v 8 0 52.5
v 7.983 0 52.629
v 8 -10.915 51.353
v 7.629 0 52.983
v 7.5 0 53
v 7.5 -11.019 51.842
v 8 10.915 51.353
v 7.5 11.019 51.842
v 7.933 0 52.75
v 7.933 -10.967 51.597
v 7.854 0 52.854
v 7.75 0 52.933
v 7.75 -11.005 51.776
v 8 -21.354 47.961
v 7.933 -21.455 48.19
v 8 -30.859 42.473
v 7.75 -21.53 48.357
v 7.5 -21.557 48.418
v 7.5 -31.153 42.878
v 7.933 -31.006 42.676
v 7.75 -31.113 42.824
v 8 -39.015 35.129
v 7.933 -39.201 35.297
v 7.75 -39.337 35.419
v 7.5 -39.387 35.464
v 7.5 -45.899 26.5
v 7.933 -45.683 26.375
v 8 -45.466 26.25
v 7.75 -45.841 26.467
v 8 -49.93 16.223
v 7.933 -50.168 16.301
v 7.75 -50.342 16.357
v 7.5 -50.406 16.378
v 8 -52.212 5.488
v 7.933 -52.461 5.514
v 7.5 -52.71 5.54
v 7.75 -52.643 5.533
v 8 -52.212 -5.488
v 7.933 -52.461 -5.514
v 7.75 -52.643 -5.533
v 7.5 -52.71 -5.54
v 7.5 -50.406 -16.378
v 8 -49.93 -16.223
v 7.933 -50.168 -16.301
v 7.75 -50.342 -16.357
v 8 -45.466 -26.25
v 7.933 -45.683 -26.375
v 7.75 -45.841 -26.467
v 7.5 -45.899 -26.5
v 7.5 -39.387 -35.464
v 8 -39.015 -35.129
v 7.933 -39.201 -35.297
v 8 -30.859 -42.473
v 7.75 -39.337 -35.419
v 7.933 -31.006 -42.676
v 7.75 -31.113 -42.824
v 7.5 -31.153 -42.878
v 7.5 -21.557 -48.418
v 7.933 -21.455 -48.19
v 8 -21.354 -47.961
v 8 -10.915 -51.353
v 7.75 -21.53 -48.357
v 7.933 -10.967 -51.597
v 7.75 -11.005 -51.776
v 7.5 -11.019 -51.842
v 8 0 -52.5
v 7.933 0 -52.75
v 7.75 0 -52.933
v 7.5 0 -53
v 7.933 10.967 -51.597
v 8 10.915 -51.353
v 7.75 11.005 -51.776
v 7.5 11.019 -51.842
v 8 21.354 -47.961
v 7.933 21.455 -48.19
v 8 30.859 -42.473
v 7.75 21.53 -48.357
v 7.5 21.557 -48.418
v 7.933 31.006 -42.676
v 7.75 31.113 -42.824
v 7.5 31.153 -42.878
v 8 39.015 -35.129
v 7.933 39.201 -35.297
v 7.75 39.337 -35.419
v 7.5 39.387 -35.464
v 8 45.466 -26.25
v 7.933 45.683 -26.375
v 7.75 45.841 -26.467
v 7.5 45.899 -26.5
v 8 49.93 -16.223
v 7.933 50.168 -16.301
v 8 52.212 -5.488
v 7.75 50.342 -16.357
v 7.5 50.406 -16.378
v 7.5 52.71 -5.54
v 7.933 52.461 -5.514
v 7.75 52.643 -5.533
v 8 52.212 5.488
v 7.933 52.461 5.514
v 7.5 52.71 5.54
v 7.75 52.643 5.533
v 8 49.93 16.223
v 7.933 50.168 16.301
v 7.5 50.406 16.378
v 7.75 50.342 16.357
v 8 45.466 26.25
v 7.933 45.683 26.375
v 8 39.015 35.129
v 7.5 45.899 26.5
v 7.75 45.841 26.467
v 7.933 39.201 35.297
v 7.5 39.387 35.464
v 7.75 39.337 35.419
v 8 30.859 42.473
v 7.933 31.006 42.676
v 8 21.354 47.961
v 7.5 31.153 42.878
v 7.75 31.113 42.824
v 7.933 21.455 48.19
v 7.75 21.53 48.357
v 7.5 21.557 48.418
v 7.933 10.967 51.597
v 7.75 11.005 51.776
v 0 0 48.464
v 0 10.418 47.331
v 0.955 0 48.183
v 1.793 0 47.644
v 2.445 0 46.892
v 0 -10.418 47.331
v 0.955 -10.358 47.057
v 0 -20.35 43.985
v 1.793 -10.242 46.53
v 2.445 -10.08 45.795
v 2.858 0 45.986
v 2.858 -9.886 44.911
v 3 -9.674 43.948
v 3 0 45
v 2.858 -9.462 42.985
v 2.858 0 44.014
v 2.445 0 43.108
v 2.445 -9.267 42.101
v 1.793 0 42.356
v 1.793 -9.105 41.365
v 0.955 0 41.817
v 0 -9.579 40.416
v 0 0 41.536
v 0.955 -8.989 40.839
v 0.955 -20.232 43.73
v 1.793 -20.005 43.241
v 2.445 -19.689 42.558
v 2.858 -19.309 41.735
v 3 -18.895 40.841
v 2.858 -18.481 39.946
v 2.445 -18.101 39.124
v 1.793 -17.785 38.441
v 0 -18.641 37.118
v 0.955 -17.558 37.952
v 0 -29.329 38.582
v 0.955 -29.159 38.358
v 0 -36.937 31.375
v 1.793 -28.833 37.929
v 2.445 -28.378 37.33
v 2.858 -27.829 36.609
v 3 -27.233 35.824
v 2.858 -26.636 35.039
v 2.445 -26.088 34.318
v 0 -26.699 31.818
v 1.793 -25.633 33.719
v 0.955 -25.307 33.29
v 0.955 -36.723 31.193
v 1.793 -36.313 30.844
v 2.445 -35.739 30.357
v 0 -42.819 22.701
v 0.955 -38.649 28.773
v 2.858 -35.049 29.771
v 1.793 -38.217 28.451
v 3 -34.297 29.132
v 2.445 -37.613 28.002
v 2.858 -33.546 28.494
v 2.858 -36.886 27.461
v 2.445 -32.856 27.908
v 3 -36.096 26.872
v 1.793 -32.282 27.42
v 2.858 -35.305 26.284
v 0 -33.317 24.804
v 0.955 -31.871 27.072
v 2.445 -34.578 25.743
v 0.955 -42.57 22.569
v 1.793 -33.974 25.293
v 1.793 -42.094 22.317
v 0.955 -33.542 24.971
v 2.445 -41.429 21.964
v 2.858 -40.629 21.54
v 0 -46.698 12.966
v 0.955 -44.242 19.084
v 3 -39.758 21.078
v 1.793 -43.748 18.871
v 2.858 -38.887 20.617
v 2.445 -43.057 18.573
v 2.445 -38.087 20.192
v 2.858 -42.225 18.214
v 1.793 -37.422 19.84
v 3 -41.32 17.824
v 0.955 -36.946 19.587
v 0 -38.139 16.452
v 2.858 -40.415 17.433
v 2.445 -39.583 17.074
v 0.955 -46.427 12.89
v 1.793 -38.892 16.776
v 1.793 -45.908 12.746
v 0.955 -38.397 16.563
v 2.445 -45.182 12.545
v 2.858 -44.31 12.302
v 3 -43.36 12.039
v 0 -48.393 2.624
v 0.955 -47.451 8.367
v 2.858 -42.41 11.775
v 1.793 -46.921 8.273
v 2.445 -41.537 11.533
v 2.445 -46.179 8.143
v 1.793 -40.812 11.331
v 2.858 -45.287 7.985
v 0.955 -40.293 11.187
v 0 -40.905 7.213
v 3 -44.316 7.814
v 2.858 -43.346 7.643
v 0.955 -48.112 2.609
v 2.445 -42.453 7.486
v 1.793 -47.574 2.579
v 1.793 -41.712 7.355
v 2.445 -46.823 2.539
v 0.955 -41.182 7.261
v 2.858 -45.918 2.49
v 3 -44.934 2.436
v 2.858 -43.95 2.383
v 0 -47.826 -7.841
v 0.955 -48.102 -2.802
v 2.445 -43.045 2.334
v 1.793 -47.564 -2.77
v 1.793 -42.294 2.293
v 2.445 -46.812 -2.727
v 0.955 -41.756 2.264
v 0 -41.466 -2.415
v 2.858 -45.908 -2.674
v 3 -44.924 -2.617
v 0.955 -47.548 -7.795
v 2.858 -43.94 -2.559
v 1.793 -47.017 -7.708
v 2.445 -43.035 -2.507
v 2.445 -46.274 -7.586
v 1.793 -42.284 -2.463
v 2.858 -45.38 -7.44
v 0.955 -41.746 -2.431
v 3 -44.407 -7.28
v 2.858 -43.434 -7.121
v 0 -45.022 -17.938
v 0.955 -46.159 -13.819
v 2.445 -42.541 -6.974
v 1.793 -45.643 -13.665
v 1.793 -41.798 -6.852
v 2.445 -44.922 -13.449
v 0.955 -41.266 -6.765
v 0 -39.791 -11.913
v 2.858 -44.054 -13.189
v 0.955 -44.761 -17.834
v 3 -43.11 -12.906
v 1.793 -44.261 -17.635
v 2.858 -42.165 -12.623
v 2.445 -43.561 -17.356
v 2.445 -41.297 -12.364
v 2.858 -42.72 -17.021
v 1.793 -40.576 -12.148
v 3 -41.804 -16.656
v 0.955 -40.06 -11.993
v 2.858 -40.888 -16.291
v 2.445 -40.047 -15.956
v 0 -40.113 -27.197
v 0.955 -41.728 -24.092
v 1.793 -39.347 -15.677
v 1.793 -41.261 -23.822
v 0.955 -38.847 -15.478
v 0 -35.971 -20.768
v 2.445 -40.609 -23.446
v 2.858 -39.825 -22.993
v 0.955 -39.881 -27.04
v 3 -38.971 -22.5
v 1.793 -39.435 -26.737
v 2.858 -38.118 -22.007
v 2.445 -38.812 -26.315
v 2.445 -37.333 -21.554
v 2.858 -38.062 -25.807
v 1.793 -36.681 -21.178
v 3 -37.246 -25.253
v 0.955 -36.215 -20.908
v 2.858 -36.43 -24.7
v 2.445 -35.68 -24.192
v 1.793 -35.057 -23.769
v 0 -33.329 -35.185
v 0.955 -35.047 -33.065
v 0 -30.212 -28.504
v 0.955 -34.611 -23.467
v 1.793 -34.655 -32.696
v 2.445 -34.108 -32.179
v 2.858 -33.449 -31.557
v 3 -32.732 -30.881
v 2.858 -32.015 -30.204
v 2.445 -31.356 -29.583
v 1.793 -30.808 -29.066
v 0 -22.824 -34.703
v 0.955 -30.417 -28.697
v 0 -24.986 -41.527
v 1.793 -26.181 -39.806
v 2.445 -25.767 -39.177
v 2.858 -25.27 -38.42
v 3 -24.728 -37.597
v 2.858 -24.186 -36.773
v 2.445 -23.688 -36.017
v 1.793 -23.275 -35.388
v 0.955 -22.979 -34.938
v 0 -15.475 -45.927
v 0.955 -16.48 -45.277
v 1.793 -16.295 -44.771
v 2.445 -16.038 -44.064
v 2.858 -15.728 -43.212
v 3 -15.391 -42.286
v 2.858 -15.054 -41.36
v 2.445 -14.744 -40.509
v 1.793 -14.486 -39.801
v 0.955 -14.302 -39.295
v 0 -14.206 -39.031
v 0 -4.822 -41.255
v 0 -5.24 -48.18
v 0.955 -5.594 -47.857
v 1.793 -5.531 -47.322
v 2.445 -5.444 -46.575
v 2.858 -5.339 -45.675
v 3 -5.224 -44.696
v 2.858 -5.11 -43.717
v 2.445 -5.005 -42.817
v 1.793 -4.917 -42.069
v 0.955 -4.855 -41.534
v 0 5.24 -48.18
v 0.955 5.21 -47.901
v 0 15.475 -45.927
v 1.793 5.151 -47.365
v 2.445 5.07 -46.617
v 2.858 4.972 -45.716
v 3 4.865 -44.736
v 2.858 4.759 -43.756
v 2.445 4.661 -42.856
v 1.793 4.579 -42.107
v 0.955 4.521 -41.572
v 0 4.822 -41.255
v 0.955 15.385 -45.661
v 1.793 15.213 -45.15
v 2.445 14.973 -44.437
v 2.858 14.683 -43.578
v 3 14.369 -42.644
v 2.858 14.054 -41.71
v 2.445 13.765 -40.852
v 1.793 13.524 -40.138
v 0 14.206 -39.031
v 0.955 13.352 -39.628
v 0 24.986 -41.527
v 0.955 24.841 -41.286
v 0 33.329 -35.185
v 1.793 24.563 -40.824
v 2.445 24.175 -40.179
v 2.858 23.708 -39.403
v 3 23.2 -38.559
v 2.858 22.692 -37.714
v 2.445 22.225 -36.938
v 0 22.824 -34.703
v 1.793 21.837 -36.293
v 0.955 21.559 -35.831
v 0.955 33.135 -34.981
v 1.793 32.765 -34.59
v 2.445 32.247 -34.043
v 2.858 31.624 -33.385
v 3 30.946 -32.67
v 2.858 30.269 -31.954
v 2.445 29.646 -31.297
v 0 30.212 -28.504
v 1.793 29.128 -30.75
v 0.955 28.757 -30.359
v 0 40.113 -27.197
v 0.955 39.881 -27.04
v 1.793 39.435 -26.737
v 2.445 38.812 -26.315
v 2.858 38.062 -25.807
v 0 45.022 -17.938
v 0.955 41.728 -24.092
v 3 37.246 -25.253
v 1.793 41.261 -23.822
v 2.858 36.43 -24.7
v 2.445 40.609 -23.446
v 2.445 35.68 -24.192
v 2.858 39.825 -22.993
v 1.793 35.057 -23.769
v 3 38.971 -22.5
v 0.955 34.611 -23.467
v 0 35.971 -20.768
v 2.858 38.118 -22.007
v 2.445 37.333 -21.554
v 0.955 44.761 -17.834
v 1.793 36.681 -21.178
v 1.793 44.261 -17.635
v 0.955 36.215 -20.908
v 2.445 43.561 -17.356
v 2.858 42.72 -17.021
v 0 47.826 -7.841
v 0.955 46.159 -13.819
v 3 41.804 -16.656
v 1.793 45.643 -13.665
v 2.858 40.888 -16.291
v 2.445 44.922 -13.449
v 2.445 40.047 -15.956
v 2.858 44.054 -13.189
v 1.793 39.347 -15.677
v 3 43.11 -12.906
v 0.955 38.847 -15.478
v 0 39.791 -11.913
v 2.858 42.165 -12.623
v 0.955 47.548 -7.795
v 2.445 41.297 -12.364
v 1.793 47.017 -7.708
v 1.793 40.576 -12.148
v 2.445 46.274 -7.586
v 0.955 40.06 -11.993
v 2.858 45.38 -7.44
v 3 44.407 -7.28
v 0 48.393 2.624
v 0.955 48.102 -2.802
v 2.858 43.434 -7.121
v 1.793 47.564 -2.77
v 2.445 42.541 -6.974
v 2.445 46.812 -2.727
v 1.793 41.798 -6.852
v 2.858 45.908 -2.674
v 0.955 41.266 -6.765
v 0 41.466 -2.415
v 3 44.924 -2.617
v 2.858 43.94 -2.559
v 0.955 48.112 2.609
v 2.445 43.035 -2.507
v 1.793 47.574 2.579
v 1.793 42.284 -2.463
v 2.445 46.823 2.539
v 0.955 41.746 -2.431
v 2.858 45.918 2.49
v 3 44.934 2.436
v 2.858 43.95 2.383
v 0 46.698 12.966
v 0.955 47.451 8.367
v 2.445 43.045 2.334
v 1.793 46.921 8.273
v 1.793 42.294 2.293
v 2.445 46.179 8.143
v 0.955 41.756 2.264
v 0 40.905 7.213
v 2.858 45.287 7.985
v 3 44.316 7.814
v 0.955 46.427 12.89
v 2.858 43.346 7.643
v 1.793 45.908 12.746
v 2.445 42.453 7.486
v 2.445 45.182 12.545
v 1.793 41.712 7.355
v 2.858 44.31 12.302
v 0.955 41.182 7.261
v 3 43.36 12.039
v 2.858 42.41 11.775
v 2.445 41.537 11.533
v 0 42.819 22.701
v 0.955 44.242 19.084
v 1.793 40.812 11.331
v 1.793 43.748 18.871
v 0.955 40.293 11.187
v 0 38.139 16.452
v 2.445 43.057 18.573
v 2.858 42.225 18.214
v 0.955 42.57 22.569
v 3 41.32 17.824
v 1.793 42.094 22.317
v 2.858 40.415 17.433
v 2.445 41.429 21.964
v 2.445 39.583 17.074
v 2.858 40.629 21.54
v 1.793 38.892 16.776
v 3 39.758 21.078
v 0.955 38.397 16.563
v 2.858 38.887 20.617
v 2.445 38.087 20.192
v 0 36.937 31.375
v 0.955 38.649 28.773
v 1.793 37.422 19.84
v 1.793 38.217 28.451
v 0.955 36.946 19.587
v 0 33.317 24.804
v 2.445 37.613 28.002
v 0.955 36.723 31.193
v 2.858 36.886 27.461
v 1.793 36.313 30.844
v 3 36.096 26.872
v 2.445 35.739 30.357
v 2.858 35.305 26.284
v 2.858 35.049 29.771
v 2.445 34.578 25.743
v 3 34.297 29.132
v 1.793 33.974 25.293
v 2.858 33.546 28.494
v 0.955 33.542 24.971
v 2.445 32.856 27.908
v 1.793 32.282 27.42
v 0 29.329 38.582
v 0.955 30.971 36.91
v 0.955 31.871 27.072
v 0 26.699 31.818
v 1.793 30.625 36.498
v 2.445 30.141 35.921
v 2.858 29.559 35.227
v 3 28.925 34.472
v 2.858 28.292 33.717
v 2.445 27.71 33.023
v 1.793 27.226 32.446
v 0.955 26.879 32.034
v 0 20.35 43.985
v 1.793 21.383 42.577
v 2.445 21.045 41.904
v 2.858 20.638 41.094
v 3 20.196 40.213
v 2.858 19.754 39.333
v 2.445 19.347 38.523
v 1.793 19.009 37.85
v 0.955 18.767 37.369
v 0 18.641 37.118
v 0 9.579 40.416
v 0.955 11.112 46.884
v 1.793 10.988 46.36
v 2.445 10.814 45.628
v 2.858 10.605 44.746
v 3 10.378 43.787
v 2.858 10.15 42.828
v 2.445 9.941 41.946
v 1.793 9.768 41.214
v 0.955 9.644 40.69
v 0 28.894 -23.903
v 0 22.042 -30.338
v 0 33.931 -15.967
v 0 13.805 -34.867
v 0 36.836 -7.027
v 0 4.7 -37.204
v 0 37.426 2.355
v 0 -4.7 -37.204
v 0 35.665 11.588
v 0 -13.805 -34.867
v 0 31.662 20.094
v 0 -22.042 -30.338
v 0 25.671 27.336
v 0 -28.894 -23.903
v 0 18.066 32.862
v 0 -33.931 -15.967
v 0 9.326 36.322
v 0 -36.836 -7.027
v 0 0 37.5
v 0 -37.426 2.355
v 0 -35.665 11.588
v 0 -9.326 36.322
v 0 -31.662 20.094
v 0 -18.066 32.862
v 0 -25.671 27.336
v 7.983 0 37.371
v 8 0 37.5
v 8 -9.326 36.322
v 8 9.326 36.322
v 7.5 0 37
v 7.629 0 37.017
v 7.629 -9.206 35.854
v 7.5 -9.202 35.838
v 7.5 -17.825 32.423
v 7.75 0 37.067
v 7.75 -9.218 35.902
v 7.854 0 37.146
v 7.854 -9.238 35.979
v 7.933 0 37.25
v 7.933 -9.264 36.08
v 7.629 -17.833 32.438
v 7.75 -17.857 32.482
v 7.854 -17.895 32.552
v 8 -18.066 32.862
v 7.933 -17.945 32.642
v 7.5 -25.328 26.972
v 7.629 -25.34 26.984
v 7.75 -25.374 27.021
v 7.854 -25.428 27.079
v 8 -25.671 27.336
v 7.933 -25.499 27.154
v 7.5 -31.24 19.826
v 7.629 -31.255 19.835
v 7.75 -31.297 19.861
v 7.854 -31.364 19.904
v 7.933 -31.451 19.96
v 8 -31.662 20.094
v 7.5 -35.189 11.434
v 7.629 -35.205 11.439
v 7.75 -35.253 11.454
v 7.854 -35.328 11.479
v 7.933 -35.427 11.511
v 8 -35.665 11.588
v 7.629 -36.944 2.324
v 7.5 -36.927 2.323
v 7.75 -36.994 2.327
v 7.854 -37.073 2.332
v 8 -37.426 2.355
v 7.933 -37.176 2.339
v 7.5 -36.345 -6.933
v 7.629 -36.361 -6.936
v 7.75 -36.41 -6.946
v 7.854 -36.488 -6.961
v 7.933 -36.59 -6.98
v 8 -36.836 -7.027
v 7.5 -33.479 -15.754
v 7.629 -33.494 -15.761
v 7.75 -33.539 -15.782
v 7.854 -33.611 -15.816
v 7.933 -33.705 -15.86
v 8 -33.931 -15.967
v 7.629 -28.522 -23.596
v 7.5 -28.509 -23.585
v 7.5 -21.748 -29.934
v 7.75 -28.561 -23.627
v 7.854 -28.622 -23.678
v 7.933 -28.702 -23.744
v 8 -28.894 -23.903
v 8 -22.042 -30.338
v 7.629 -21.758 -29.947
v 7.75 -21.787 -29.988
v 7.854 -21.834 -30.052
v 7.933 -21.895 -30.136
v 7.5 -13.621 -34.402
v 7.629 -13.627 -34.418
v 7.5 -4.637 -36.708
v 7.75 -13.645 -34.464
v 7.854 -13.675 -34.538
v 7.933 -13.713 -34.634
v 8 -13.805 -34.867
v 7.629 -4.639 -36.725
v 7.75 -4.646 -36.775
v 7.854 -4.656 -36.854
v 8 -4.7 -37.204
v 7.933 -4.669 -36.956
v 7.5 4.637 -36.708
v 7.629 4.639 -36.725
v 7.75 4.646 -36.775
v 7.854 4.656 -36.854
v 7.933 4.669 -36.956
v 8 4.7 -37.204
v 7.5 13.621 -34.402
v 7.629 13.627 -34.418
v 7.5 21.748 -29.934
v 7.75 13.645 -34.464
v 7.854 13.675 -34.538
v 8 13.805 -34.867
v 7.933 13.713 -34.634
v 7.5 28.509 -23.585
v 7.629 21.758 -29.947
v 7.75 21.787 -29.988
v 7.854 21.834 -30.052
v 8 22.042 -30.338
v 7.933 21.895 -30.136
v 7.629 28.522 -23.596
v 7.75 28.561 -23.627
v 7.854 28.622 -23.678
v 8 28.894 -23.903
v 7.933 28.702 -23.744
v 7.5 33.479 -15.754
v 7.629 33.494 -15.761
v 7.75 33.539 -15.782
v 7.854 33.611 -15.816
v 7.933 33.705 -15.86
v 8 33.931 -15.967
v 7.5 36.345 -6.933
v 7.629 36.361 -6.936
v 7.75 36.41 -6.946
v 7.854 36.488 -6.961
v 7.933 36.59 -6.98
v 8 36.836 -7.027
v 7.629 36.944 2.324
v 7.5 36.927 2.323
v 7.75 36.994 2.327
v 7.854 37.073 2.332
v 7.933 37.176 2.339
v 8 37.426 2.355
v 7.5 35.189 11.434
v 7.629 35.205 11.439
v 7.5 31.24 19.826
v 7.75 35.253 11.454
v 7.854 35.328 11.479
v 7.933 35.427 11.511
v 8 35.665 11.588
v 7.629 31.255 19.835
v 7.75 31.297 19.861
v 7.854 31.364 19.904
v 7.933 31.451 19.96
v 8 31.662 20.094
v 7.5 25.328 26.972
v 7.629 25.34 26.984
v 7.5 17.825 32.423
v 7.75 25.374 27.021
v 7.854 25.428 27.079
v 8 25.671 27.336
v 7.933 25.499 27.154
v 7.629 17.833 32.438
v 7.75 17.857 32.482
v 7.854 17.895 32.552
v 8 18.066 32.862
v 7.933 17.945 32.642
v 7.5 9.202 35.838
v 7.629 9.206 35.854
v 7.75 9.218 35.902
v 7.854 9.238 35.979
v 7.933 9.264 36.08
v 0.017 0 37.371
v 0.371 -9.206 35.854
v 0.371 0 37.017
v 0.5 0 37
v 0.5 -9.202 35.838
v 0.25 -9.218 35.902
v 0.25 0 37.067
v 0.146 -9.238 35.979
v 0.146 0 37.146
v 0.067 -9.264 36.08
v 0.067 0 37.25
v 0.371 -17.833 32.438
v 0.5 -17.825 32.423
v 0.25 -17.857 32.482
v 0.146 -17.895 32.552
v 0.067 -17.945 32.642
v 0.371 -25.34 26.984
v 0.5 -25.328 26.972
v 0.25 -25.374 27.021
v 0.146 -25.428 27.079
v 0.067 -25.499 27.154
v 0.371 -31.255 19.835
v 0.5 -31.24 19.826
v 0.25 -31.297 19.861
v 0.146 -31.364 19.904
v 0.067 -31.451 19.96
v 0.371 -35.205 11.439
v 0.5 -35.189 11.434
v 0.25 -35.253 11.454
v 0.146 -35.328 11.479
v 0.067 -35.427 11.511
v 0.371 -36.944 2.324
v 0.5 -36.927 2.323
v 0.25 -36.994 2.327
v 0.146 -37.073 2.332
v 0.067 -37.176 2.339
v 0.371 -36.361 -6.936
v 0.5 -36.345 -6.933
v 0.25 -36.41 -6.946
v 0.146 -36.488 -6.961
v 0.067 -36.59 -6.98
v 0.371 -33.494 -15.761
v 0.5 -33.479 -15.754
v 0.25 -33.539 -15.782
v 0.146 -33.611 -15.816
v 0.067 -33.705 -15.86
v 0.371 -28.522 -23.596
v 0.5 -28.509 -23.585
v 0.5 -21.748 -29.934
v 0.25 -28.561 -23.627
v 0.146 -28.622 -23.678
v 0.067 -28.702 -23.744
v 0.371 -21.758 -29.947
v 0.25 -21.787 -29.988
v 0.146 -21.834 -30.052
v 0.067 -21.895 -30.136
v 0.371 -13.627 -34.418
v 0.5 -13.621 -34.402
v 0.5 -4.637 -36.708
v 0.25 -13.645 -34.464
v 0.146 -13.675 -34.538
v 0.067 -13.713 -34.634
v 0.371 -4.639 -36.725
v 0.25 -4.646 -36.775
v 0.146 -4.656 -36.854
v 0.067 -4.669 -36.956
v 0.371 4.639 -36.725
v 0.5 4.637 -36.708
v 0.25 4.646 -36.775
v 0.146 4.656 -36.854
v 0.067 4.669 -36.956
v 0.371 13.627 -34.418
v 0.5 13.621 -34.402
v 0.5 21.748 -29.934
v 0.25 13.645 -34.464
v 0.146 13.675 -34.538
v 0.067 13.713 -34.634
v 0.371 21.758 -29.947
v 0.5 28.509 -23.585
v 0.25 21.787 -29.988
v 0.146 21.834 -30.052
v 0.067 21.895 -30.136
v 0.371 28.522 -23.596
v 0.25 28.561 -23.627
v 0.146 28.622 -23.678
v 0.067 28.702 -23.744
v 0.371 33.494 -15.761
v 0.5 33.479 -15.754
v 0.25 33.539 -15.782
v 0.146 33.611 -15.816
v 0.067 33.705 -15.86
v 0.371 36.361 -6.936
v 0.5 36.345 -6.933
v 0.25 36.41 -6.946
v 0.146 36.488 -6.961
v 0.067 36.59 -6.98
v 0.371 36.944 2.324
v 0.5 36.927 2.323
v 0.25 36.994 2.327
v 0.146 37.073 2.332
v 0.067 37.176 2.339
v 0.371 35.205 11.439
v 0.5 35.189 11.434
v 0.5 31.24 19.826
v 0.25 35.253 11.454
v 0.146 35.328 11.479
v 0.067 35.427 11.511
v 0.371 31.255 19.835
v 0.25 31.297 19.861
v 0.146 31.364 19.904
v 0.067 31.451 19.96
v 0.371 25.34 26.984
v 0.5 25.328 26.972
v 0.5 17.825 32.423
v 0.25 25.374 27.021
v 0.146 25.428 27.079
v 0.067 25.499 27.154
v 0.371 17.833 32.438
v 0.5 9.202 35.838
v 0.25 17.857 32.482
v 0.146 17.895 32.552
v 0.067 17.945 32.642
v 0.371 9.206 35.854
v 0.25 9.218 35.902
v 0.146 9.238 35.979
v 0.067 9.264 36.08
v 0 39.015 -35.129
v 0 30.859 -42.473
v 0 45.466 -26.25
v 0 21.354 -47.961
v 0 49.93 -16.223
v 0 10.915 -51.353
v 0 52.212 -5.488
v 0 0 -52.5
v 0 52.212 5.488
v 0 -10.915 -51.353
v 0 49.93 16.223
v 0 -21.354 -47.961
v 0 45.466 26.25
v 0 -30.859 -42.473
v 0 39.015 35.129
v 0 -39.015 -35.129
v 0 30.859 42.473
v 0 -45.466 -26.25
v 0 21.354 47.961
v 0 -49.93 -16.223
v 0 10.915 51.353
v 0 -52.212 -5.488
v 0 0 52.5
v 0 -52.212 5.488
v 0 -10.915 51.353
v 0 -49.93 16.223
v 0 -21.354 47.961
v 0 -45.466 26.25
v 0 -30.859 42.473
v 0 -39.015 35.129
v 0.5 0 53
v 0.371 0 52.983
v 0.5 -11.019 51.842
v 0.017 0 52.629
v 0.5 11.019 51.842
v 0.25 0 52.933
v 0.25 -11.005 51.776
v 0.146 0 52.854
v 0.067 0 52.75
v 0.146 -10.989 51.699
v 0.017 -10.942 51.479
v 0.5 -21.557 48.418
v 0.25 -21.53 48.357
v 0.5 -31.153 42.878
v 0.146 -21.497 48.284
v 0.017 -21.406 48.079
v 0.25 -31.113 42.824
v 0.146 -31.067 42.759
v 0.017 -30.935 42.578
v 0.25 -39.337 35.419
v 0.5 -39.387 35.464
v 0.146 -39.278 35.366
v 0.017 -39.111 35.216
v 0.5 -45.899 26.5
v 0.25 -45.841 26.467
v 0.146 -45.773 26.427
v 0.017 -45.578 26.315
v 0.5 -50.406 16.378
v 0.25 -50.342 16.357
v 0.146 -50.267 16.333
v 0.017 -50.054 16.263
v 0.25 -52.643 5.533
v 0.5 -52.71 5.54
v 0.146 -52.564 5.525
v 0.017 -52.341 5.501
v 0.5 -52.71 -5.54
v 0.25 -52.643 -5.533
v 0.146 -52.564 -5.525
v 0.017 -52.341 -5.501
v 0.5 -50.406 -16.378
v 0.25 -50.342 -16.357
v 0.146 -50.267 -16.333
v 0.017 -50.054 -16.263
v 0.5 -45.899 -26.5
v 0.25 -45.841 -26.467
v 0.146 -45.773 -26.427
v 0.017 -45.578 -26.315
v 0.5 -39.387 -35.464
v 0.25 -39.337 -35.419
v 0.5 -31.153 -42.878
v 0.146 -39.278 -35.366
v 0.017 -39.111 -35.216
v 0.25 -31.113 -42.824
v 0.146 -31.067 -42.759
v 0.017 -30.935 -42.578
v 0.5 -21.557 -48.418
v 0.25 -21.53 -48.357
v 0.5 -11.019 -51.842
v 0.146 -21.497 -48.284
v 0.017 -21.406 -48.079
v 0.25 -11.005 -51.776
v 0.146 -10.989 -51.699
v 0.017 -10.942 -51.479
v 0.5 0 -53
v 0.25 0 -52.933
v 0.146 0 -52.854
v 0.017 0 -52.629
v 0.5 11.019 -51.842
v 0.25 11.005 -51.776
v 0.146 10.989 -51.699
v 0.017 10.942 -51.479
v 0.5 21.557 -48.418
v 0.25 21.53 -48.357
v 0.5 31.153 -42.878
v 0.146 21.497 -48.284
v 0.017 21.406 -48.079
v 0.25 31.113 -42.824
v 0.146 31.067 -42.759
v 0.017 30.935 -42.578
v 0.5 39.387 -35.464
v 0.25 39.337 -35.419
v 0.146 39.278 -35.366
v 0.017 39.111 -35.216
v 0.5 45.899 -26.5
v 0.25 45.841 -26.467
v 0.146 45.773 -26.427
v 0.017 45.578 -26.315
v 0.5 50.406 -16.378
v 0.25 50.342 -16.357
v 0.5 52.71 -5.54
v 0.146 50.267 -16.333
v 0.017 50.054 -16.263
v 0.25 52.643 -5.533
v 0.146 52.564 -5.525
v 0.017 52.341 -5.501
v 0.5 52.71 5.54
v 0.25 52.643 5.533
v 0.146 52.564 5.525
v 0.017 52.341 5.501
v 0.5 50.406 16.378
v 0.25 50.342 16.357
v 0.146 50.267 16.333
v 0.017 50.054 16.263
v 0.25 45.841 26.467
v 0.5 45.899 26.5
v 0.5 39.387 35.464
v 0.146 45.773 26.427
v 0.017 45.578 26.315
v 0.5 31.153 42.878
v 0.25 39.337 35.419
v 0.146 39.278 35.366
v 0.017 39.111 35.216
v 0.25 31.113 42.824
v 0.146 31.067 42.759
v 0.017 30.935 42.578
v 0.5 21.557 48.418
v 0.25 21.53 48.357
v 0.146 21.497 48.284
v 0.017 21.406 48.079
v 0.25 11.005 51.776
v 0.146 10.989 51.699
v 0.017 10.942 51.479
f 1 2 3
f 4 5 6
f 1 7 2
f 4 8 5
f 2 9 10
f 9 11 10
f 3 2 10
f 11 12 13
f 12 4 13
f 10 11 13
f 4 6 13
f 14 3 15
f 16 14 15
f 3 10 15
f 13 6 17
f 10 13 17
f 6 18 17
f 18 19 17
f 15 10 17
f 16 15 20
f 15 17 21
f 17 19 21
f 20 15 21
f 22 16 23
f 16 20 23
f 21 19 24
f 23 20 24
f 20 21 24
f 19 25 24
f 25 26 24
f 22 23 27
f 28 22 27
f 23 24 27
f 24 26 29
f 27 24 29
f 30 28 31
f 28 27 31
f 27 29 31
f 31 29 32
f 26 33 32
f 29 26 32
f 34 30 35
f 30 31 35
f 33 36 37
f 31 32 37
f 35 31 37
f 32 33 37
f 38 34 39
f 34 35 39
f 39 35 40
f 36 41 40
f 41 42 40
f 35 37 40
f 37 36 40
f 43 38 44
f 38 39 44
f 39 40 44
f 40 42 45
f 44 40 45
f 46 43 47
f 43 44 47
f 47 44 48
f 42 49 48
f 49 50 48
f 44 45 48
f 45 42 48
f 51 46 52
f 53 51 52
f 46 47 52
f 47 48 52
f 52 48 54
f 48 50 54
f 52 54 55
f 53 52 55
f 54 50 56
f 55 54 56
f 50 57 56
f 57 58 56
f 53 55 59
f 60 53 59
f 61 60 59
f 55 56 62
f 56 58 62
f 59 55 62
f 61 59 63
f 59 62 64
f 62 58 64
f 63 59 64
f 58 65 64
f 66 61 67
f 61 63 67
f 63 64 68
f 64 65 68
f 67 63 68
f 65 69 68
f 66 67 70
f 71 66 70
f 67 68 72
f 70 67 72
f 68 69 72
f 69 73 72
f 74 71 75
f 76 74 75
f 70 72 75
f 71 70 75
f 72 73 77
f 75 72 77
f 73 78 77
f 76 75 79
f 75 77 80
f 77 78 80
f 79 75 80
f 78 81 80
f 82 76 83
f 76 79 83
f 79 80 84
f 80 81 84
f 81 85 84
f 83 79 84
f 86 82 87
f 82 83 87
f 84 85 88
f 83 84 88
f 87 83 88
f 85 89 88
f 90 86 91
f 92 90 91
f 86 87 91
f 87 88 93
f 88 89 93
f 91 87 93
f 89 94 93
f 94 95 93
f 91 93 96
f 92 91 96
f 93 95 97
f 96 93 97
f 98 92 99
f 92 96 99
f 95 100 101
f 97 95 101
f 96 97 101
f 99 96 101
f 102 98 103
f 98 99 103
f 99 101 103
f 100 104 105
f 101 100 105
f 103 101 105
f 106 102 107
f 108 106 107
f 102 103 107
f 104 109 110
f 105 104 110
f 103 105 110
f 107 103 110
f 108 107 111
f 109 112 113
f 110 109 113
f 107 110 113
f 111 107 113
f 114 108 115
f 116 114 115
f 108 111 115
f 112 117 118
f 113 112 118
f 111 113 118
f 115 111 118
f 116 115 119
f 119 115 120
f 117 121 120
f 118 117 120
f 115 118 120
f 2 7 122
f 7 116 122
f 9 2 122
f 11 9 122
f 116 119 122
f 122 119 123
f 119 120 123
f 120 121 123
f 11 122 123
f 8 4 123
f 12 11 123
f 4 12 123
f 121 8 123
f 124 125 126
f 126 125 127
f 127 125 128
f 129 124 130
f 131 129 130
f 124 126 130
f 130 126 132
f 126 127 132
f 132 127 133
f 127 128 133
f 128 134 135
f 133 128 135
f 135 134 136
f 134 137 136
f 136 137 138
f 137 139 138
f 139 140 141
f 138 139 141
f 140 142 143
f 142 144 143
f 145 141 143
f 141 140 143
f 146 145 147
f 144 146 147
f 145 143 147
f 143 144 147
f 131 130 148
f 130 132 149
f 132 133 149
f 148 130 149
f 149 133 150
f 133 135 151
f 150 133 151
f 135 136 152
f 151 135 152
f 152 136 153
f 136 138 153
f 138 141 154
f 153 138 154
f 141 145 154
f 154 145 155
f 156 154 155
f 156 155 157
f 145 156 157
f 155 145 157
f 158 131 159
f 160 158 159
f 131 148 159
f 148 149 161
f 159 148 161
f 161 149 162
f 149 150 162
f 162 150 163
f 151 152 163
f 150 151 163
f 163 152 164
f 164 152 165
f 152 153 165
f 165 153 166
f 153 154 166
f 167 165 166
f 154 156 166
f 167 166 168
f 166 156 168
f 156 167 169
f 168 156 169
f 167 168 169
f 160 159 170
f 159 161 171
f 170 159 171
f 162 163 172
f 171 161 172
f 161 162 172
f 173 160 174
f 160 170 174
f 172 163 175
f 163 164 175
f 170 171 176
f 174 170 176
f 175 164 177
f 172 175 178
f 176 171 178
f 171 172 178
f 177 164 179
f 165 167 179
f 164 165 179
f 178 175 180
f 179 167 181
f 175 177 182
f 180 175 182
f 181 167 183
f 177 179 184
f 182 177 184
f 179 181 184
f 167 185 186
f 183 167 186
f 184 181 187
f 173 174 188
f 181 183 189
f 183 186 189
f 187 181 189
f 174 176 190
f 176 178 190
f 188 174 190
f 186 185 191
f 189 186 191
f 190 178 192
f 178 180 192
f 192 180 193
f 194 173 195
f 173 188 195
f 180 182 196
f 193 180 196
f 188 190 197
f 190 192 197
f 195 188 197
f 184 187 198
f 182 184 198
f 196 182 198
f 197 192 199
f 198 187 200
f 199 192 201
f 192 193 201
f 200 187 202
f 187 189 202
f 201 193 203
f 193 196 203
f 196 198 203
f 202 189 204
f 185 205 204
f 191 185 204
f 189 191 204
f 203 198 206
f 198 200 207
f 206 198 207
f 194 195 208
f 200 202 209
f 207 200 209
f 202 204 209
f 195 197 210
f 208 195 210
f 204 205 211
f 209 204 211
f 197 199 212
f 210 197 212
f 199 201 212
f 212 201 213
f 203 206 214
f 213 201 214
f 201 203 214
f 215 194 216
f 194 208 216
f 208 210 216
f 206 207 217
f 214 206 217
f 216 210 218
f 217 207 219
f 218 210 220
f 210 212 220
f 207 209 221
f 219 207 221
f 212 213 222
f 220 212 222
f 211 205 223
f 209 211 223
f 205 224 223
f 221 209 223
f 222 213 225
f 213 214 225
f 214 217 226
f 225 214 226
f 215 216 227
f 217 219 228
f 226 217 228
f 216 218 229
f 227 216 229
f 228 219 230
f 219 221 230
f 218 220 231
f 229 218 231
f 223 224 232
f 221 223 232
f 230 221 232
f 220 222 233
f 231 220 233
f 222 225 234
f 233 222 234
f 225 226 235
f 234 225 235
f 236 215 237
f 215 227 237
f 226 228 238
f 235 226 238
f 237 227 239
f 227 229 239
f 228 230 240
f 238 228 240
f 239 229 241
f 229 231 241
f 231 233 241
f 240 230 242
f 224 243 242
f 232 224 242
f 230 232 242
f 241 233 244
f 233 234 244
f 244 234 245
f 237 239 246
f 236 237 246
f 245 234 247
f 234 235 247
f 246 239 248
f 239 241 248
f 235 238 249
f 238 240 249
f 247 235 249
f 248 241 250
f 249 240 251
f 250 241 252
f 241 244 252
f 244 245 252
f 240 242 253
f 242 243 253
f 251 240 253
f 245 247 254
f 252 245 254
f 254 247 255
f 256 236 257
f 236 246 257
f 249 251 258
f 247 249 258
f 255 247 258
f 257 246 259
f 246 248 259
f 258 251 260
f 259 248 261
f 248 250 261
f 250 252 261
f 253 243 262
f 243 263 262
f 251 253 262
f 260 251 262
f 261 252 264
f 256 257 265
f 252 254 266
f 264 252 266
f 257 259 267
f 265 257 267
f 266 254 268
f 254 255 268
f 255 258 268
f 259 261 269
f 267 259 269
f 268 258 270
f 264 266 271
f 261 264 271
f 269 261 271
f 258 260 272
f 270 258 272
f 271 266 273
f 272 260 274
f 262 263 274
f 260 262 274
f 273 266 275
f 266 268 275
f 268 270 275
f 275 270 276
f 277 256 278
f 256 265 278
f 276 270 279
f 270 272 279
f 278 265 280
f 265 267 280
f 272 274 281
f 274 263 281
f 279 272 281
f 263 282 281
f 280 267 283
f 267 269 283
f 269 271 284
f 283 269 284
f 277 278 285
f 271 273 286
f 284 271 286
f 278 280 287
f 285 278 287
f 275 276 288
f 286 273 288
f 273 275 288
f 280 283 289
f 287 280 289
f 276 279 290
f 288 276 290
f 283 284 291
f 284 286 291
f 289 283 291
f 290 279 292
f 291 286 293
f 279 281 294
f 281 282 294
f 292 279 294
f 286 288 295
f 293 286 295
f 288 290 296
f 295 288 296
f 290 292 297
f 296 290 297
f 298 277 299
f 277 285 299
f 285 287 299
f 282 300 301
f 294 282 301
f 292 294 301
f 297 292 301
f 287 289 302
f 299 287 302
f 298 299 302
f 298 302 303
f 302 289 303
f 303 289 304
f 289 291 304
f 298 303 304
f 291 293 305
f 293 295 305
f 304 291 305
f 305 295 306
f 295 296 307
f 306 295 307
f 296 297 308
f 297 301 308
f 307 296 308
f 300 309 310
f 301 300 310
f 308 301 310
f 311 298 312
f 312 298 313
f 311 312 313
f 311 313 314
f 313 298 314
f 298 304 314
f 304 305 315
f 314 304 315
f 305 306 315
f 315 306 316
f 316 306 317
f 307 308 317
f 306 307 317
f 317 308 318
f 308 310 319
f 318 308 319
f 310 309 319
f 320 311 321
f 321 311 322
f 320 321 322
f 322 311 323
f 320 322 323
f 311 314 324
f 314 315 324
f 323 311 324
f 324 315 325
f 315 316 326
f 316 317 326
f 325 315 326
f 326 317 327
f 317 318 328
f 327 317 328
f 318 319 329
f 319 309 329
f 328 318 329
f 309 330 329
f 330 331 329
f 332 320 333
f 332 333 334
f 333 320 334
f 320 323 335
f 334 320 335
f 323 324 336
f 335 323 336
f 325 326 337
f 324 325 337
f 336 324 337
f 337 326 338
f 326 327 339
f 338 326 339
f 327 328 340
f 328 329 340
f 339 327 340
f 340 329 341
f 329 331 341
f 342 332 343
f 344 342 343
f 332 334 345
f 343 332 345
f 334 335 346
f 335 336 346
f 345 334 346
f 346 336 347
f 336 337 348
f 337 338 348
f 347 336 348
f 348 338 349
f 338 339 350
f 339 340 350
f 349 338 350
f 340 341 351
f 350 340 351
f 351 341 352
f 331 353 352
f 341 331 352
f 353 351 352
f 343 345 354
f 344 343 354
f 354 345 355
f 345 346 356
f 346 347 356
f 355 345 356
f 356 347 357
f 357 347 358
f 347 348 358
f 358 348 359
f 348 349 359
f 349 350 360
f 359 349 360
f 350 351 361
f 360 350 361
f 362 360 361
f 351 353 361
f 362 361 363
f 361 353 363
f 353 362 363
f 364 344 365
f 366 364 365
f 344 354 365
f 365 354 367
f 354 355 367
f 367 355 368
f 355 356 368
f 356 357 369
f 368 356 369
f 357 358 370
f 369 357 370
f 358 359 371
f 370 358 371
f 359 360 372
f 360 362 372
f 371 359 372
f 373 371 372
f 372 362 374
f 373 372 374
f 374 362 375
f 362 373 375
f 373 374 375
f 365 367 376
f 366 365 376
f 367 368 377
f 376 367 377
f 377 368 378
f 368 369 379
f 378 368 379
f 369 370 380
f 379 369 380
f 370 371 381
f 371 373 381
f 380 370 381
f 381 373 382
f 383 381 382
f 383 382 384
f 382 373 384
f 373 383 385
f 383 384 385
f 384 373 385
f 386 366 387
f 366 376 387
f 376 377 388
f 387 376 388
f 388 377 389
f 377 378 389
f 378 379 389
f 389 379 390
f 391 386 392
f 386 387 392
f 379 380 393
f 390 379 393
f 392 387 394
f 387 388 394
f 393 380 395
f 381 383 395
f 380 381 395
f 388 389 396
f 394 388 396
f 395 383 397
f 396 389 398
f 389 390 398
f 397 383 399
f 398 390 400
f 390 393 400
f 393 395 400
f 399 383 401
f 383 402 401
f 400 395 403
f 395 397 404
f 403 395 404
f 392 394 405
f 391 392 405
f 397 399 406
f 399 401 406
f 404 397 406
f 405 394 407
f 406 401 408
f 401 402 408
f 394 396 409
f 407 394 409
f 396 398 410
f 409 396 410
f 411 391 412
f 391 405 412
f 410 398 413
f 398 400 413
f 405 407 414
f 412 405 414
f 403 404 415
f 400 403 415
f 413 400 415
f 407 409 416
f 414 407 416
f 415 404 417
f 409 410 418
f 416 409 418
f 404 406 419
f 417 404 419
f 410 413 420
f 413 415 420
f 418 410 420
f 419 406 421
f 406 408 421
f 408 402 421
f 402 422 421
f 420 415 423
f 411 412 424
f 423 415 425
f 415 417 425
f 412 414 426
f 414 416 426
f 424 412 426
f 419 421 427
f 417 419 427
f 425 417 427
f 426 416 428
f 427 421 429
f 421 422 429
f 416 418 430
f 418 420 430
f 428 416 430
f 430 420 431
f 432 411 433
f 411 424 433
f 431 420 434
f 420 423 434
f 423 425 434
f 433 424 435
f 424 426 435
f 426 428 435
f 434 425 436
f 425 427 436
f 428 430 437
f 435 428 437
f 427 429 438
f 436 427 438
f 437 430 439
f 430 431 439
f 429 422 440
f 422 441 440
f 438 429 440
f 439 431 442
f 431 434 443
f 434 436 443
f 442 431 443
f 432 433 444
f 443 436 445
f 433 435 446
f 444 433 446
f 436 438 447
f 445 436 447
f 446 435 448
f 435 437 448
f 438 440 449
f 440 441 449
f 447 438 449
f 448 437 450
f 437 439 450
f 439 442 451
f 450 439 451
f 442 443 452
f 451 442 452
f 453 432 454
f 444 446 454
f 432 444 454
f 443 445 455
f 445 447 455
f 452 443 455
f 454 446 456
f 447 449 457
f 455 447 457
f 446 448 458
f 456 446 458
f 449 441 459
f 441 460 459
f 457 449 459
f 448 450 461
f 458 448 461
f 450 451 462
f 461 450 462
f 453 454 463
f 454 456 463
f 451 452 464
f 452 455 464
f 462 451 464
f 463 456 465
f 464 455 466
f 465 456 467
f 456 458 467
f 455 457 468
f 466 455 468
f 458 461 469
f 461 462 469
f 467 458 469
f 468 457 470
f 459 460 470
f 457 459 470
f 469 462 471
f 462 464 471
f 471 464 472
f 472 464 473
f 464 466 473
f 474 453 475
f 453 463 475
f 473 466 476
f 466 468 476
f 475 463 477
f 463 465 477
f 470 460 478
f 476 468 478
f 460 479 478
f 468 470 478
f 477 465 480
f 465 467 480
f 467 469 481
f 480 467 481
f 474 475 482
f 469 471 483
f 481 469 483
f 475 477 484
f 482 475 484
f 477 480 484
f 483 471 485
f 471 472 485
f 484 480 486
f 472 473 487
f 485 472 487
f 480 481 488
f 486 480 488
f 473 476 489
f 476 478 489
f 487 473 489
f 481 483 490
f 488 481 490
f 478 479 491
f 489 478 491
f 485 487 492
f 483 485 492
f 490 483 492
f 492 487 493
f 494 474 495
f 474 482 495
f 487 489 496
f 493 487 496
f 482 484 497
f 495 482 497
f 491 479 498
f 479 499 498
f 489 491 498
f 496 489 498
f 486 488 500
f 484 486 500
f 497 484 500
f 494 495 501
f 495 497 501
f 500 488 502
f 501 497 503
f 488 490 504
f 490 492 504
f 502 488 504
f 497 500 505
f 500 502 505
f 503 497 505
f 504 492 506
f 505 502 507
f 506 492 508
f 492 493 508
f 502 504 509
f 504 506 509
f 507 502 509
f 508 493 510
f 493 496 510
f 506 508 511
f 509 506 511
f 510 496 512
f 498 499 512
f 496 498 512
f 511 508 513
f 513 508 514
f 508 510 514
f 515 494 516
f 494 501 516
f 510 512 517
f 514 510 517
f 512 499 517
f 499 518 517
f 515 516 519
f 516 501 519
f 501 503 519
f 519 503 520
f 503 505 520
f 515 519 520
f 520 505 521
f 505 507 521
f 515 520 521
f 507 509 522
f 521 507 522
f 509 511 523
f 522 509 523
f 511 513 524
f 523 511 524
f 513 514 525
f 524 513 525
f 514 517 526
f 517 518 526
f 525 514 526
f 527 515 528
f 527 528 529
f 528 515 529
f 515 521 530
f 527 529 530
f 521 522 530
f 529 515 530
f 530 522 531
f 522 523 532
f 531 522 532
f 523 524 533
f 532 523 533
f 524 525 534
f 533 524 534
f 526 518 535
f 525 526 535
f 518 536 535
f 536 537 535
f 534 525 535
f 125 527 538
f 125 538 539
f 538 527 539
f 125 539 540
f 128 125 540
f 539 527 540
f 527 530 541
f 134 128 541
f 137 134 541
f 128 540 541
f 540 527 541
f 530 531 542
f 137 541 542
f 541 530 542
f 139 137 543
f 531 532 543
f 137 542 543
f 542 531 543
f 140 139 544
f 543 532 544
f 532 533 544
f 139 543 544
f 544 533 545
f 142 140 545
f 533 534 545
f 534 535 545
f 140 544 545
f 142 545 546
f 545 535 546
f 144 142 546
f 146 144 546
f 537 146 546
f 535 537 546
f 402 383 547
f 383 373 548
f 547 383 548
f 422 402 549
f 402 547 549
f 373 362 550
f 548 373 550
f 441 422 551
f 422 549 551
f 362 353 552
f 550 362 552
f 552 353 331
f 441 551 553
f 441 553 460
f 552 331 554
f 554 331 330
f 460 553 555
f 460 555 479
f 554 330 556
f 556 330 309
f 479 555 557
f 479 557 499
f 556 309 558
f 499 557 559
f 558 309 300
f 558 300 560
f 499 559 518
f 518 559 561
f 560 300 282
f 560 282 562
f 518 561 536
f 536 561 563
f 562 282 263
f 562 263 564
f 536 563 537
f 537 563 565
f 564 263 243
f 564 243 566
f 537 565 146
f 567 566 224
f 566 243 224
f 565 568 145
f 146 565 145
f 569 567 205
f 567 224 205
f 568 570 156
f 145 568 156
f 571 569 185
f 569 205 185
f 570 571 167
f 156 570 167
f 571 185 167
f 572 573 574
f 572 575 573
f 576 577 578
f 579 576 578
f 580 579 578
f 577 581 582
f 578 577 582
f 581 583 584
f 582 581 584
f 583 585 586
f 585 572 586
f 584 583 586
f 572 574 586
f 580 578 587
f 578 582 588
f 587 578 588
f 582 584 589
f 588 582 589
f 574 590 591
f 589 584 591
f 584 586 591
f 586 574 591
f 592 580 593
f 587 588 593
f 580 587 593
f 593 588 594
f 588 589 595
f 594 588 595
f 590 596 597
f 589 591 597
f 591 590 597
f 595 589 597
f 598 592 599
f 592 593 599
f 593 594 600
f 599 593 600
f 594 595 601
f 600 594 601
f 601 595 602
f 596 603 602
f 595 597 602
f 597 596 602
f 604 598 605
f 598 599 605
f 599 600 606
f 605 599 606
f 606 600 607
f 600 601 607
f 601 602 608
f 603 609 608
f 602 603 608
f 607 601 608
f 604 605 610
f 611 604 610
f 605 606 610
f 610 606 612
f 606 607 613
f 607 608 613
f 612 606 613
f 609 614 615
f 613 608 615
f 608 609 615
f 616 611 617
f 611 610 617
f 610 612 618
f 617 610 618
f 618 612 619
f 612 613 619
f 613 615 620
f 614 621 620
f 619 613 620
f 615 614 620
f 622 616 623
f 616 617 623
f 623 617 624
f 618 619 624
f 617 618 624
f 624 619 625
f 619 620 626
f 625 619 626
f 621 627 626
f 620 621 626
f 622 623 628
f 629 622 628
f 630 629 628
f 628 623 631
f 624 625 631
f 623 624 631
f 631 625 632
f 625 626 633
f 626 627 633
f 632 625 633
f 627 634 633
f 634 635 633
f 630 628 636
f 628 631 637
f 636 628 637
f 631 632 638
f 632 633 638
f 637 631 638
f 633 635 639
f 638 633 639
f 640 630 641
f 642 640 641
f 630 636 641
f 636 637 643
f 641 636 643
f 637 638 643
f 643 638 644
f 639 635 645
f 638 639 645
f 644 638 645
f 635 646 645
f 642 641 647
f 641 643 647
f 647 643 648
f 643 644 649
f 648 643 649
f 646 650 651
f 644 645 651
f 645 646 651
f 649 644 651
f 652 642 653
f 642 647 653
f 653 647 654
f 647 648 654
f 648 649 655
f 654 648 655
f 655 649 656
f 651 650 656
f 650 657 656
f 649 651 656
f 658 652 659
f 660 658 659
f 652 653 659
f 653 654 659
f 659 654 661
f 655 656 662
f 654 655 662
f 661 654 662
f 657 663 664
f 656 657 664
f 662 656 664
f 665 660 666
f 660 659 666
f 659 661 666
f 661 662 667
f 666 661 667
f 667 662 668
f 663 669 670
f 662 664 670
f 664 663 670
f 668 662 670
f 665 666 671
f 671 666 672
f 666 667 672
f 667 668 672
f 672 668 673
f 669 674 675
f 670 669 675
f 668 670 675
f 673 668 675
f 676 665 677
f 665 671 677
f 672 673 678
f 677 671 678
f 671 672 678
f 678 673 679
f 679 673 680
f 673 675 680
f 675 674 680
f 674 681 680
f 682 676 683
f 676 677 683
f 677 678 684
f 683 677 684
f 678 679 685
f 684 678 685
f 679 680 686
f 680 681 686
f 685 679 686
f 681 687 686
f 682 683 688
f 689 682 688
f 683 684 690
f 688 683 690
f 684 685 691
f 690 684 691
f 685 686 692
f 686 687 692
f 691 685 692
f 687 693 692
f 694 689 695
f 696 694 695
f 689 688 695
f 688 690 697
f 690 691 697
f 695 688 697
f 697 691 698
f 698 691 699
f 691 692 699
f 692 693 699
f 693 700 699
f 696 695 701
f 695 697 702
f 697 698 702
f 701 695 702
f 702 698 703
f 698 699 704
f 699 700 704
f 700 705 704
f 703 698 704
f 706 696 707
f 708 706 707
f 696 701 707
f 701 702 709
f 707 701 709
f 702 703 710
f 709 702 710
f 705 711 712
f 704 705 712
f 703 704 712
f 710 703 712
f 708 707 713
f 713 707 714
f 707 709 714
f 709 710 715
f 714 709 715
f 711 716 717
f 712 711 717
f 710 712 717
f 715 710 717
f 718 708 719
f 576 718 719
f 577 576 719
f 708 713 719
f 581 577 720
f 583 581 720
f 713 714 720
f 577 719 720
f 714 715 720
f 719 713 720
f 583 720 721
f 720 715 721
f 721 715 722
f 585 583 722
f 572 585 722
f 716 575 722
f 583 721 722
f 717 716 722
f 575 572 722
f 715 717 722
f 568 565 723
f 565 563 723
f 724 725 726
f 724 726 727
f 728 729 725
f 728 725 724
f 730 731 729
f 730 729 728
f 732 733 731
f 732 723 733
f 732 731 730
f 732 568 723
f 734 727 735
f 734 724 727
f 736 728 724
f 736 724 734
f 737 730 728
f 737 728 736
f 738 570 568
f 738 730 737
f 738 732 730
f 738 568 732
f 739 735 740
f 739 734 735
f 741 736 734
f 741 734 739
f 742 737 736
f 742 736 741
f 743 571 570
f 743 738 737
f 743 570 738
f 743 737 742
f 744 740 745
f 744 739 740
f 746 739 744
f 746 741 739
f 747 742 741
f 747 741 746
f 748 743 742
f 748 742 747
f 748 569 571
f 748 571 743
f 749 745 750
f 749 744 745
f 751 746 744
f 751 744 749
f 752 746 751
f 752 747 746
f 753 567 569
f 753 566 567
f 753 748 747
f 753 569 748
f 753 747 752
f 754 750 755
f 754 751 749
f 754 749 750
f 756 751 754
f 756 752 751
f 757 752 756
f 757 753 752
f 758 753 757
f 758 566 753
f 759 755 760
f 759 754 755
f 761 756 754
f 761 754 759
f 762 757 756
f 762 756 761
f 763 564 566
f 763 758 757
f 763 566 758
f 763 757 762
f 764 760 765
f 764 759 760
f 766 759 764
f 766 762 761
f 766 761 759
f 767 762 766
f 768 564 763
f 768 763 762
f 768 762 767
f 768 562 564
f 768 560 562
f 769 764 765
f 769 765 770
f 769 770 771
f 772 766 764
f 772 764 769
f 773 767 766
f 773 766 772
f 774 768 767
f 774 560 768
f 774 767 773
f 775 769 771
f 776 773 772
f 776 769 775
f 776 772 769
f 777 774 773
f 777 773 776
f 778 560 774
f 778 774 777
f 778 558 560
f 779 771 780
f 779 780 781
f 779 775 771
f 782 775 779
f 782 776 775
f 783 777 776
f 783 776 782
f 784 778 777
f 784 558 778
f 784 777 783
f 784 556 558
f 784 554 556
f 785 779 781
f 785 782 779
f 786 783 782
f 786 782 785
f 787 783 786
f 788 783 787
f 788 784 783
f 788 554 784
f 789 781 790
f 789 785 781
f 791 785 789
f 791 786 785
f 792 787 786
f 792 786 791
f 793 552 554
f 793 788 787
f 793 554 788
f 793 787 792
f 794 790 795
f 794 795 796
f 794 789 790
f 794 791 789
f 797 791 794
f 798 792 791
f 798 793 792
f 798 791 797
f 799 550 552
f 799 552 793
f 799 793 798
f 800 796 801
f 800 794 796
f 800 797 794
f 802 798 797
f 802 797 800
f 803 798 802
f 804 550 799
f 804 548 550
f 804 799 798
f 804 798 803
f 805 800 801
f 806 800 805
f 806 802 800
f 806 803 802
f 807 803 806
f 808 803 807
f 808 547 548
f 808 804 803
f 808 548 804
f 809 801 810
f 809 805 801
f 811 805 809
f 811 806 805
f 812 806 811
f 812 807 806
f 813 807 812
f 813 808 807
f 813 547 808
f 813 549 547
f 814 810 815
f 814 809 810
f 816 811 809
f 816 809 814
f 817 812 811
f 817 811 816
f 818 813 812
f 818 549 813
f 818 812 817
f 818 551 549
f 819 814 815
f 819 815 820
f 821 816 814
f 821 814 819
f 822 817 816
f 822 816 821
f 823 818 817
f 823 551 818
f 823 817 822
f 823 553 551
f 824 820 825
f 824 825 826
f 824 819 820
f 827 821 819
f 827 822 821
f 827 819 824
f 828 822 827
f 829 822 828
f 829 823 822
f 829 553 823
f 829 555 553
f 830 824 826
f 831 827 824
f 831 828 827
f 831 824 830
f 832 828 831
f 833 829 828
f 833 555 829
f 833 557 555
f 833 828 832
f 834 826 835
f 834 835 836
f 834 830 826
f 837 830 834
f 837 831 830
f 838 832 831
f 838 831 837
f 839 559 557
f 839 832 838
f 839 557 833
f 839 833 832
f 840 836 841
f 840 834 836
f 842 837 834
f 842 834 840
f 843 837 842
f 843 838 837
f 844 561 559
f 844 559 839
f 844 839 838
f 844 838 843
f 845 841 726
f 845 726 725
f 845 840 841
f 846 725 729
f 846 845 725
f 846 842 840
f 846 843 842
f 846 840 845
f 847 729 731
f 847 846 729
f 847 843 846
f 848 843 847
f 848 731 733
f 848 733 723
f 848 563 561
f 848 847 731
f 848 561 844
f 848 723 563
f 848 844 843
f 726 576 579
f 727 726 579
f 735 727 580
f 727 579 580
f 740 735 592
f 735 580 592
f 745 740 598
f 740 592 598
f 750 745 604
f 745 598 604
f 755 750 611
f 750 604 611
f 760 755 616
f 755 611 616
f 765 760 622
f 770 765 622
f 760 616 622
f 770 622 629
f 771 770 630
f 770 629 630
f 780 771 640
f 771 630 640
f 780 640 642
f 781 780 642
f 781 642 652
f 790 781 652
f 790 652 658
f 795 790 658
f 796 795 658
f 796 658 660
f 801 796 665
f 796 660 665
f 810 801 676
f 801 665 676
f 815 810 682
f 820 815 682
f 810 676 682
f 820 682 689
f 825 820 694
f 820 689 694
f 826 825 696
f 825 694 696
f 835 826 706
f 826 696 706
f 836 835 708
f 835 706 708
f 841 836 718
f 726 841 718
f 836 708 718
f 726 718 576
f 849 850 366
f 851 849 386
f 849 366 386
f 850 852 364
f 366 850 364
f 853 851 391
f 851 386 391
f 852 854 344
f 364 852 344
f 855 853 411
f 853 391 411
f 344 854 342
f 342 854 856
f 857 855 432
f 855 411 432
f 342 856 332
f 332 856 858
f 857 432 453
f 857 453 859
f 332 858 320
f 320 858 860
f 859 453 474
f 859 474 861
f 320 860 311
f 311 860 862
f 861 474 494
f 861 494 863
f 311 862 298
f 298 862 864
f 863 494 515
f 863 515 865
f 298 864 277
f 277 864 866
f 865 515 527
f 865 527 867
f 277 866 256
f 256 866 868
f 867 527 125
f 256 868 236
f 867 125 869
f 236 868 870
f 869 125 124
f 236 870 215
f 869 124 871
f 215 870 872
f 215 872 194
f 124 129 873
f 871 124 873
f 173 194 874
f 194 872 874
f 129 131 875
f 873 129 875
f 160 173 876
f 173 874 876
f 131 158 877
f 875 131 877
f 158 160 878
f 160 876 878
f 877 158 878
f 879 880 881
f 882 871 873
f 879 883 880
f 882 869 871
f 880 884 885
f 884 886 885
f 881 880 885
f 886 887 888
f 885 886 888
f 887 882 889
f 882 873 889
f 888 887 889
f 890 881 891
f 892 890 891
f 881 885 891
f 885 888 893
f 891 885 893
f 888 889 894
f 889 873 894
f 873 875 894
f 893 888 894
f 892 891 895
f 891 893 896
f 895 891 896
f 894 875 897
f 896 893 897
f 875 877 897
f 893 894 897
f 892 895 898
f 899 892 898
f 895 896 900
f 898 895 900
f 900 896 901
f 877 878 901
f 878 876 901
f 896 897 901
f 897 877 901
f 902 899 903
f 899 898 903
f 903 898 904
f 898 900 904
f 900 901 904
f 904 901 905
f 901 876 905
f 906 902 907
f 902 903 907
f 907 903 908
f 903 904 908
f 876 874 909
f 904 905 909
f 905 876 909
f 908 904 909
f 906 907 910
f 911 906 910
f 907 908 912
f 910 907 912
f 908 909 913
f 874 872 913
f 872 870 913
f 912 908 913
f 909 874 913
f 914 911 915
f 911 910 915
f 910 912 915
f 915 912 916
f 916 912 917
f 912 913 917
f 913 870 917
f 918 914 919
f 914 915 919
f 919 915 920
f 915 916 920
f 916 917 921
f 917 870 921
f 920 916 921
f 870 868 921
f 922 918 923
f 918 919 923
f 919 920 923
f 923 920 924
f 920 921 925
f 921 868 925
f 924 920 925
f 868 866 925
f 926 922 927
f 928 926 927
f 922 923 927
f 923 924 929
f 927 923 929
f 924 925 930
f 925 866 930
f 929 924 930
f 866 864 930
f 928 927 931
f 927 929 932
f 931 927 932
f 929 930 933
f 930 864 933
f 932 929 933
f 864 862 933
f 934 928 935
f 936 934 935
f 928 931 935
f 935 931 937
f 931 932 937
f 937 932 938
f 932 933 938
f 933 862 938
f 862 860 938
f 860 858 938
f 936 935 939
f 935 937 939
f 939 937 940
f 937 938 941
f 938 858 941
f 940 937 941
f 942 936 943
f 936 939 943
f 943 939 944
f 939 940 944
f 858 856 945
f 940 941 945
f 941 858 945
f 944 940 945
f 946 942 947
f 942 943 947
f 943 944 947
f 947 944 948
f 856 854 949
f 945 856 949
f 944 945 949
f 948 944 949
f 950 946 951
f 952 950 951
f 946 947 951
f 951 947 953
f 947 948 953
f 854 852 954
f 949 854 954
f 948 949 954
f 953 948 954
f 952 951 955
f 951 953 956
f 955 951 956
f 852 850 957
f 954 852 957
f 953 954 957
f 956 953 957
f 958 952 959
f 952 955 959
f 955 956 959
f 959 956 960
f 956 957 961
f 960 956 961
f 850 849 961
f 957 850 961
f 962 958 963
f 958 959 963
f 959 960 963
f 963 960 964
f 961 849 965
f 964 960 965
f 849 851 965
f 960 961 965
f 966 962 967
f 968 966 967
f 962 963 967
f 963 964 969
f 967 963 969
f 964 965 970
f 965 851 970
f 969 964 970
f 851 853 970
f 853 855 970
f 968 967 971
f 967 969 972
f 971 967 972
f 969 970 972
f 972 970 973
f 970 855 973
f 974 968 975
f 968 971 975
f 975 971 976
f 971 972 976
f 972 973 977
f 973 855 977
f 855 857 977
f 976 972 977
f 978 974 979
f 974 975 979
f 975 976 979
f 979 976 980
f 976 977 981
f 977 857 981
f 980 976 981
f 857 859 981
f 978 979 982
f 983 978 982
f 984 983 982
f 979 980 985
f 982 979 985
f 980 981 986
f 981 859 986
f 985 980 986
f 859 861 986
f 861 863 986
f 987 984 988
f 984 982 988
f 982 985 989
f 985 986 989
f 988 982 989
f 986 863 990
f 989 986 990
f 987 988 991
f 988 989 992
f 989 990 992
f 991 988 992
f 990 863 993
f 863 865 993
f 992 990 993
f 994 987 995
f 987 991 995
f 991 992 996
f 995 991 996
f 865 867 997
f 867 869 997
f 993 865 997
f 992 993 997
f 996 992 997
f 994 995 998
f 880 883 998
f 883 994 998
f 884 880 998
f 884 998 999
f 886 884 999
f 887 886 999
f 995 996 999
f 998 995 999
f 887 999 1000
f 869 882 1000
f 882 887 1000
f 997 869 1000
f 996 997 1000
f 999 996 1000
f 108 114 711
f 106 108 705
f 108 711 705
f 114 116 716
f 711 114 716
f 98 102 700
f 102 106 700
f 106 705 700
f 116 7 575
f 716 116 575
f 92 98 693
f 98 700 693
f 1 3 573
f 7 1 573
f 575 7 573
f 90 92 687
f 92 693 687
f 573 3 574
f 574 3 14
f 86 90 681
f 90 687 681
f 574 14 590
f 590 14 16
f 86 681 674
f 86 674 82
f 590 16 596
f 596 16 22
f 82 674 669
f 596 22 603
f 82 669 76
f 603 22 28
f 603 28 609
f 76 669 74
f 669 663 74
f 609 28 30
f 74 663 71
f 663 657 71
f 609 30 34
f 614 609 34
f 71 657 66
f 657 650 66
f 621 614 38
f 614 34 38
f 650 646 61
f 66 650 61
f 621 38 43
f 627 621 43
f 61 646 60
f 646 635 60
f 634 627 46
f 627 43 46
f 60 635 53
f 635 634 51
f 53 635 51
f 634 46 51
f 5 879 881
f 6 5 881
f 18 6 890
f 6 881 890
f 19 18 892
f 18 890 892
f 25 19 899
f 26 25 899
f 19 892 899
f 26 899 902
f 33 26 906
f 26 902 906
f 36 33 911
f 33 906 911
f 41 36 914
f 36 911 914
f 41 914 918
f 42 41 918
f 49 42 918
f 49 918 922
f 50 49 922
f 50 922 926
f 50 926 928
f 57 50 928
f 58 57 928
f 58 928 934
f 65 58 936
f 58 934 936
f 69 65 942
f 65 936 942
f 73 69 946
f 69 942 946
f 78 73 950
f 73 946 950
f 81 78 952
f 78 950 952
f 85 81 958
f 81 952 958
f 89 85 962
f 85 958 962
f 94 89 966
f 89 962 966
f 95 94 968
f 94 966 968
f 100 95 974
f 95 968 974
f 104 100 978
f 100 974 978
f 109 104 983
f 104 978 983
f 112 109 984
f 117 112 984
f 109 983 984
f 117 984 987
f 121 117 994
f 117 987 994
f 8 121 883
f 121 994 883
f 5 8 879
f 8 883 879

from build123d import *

# Parameters (mm, degrees)
FILLET_1_R = 0.5


with BuildPart() as part:
    # Эскиз1 → Повернуть1 (revolve)
    with BuildSketch(Plane.XY, mode=Mode.PRIVATE) as revolve_1_sk:
        with BuildLine():
            Line((0, 37), (8, 37))
            Line((8, 37), (8, 53))
            Line((8, 53), (0, 53))
            Line((0, 53), (0, 48.464101615))
            ThreePointArc((0, 48.464101615), (3, 45), (0, 41.535898385))
            Line((0, 41.535898385), (0, 37))
        make_face()
    revolve(revolve_1_sk.sketch.rotate(Axis((0, 0, 0), (1, 0, 0)), 90), axis=Axis((0, 0, 0), (1, 0, 0)))

    # Скругление1
    fillet_1_edges = [part.edges().sort_by_distance(p)[0] for p in [
        (0, 0, -53),
        (8, 0, -53),
        (8, 0, -37),
        (0, 0, -37),
    ]]
    fillet(fillet_1_edges, radius=FILLET_1_R)


solid = part.part
